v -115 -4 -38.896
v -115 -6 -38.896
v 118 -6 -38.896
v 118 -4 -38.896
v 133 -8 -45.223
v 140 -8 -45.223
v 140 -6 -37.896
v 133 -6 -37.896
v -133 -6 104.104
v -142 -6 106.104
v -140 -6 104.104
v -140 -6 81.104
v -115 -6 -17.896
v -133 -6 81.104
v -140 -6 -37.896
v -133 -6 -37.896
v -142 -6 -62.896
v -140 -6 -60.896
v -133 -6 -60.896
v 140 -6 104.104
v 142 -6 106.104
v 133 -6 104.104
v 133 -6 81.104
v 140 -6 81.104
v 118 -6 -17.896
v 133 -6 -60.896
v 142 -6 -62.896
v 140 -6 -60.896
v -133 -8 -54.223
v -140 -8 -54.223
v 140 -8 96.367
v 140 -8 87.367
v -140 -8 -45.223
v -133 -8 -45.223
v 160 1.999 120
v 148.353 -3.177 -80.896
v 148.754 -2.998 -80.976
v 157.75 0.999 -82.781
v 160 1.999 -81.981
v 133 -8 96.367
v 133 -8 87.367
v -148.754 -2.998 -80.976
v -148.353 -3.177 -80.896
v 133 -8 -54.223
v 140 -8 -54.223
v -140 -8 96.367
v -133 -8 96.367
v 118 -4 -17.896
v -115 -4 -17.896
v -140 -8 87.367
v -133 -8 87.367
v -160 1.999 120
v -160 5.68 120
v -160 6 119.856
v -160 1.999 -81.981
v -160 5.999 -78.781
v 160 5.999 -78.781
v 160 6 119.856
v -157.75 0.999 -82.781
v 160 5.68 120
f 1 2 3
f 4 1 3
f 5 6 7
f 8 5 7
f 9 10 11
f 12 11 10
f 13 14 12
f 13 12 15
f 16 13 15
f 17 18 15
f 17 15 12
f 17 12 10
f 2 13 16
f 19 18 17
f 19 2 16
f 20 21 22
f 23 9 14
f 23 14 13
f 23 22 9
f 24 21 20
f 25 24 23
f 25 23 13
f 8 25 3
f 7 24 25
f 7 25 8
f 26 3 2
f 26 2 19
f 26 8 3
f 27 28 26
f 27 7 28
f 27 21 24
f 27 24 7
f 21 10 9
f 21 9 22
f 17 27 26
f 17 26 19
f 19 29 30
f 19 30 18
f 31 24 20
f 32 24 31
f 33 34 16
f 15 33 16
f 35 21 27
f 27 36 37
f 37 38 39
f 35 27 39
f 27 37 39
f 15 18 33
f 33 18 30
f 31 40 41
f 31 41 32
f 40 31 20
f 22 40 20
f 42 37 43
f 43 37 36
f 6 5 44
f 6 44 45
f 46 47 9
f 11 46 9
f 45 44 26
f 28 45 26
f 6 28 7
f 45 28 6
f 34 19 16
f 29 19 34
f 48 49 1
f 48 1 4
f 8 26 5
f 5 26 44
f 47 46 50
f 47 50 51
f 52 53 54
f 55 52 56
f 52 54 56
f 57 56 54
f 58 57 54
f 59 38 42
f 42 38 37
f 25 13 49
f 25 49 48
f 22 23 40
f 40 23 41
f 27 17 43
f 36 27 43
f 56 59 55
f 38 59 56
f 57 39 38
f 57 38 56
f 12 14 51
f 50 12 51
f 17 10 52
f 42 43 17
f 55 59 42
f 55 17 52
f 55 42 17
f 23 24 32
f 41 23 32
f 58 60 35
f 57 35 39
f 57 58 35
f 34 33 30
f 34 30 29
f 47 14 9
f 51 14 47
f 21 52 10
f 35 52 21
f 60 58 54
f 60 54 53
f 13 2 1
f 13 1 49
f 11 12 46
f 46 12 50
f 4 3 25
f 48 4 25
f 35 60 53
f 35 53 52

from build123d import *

# Parameters (mm, degrees)
BOSS_EXTRUDE2_DEPTH      = 160
CUT_EXTRUDE11_DEPTH      = 201.089979759
CUT_EXTRUDE11_DEPTH_BACK = 201.089979759
SKETCH12_W               = 233
SKETCH12_H               = 21
CUT_EXTRUDE12_DEPTH      = 2
SKETCH13_W               = 7
SKETCH13_H               = 23
BOSS_EXTRUDE3_DEPTH      = 2
CUT_EXTRUDE13_DEPTH      = 324.208910768
CUT_EXTRUDE13_DEPTH_BACK = 324.208910768


with BuildPart() as part:
    # Sketch8 → Boss-Extrude2 (new, symmetric)
    with BuildSketch(Plane(origin=(0, 0, 0), x_dir=(0, 0, -1), z_dir=(1, 0, 0))):
        Polygon((-88.104080333, -6), (62.895919667, -6), (80.895919667, -3.176729887), (80.976403784, -2.998472611), (82.781317846, 0.999074726), (78.781317846, 5.999074726), (-119.85604145, 6), (-120, 5.68), (-120, 1.998947428), (-106.104080333, -6), align=None)
    extrude(amount=BOSS_EXTRUDE2_DEPTH, both=True)

    # Sketch9 → Cut-Extrude11 (cut, two sides: drawn at the far end of the back side and taken through both)
    with BuildSketch(Plane.XY.offset(-CUT_EXTRUDE11_DEPTH_BACK)):
        Polygon((-160, -6), (-142, -6), (-160, 1.998947428), align=None)
        Polygon((160, -6), (142, -6), (160, 1.998947428), align=None)
    extrude(amount=CUT_EXTRUDE11_DEPTH + CUT_EXTRUDE11_DEPTH_BACK, mode=Mode.SUBTRACT)

    # Sketch12 → Cut-Extrude12 (cut)
    with BuildSketch(Plane.XZ.offset(6)):
        with Locations((1.5, -28.395919667)):
            Rectangle(SKETCH12_W, SKETCH12_H)
    extrude(amount=-CUT_EXTRUDE12_DEPTH, mode=Mode.SUBTRACT)

    # Sketch13 → Boss-Extrude3 (add)
    with BuildSketch(Plane.XZ.offset(6)):
        with Locations((-136.5, 92.604080333)):
            Rectangle(SKETCH13_W, SKETCH13_H)
        with Locations((-136.5, -49.395919667)):
            Rectangle(SKETCH13_W, SKETCH13_H)
        with Locations((136.5, -49.395919667)):
            Rectangle(SKETCH13_W, SKETCH13_H)
        with Locations((136.5, 92.604080333)):
            Rectangle(SKETCH13_W, SKETCH13_H)
    extrude(amount=BOSS_EXTRUDE3_DEPTH)

    # Sketch14 → Cut-Extrude13 (cut, two sides: drawn at the far end of the back side and taken through both)
    with BuildSketch(Plane.ZY.offset(140).offset(-CUT_EXTRUDE13_DEPTH_BACK)):
        Polygon((-60.895919667, -8), (-54.223413834, -8), (-60.895919667, -6), align=None)
        Polygon((104.104080333, -8), (96.367273939, -8), (104.104080333, -6), align=None)
        Polygon((81.104080333, -8), (81.104080333, -6), (87.367273939, -8), align=None)
        Polygon((-45.223413834, -8), (-37.895919667, -6), (-37.895919667, -8), align=None)
    extrude(amount=CUT_EXTRUDE13_DEPTH + CUT_EXTRUDE13_DEPTH_BACK, mode=Mode.SUBTRACT)


solid = part.part
